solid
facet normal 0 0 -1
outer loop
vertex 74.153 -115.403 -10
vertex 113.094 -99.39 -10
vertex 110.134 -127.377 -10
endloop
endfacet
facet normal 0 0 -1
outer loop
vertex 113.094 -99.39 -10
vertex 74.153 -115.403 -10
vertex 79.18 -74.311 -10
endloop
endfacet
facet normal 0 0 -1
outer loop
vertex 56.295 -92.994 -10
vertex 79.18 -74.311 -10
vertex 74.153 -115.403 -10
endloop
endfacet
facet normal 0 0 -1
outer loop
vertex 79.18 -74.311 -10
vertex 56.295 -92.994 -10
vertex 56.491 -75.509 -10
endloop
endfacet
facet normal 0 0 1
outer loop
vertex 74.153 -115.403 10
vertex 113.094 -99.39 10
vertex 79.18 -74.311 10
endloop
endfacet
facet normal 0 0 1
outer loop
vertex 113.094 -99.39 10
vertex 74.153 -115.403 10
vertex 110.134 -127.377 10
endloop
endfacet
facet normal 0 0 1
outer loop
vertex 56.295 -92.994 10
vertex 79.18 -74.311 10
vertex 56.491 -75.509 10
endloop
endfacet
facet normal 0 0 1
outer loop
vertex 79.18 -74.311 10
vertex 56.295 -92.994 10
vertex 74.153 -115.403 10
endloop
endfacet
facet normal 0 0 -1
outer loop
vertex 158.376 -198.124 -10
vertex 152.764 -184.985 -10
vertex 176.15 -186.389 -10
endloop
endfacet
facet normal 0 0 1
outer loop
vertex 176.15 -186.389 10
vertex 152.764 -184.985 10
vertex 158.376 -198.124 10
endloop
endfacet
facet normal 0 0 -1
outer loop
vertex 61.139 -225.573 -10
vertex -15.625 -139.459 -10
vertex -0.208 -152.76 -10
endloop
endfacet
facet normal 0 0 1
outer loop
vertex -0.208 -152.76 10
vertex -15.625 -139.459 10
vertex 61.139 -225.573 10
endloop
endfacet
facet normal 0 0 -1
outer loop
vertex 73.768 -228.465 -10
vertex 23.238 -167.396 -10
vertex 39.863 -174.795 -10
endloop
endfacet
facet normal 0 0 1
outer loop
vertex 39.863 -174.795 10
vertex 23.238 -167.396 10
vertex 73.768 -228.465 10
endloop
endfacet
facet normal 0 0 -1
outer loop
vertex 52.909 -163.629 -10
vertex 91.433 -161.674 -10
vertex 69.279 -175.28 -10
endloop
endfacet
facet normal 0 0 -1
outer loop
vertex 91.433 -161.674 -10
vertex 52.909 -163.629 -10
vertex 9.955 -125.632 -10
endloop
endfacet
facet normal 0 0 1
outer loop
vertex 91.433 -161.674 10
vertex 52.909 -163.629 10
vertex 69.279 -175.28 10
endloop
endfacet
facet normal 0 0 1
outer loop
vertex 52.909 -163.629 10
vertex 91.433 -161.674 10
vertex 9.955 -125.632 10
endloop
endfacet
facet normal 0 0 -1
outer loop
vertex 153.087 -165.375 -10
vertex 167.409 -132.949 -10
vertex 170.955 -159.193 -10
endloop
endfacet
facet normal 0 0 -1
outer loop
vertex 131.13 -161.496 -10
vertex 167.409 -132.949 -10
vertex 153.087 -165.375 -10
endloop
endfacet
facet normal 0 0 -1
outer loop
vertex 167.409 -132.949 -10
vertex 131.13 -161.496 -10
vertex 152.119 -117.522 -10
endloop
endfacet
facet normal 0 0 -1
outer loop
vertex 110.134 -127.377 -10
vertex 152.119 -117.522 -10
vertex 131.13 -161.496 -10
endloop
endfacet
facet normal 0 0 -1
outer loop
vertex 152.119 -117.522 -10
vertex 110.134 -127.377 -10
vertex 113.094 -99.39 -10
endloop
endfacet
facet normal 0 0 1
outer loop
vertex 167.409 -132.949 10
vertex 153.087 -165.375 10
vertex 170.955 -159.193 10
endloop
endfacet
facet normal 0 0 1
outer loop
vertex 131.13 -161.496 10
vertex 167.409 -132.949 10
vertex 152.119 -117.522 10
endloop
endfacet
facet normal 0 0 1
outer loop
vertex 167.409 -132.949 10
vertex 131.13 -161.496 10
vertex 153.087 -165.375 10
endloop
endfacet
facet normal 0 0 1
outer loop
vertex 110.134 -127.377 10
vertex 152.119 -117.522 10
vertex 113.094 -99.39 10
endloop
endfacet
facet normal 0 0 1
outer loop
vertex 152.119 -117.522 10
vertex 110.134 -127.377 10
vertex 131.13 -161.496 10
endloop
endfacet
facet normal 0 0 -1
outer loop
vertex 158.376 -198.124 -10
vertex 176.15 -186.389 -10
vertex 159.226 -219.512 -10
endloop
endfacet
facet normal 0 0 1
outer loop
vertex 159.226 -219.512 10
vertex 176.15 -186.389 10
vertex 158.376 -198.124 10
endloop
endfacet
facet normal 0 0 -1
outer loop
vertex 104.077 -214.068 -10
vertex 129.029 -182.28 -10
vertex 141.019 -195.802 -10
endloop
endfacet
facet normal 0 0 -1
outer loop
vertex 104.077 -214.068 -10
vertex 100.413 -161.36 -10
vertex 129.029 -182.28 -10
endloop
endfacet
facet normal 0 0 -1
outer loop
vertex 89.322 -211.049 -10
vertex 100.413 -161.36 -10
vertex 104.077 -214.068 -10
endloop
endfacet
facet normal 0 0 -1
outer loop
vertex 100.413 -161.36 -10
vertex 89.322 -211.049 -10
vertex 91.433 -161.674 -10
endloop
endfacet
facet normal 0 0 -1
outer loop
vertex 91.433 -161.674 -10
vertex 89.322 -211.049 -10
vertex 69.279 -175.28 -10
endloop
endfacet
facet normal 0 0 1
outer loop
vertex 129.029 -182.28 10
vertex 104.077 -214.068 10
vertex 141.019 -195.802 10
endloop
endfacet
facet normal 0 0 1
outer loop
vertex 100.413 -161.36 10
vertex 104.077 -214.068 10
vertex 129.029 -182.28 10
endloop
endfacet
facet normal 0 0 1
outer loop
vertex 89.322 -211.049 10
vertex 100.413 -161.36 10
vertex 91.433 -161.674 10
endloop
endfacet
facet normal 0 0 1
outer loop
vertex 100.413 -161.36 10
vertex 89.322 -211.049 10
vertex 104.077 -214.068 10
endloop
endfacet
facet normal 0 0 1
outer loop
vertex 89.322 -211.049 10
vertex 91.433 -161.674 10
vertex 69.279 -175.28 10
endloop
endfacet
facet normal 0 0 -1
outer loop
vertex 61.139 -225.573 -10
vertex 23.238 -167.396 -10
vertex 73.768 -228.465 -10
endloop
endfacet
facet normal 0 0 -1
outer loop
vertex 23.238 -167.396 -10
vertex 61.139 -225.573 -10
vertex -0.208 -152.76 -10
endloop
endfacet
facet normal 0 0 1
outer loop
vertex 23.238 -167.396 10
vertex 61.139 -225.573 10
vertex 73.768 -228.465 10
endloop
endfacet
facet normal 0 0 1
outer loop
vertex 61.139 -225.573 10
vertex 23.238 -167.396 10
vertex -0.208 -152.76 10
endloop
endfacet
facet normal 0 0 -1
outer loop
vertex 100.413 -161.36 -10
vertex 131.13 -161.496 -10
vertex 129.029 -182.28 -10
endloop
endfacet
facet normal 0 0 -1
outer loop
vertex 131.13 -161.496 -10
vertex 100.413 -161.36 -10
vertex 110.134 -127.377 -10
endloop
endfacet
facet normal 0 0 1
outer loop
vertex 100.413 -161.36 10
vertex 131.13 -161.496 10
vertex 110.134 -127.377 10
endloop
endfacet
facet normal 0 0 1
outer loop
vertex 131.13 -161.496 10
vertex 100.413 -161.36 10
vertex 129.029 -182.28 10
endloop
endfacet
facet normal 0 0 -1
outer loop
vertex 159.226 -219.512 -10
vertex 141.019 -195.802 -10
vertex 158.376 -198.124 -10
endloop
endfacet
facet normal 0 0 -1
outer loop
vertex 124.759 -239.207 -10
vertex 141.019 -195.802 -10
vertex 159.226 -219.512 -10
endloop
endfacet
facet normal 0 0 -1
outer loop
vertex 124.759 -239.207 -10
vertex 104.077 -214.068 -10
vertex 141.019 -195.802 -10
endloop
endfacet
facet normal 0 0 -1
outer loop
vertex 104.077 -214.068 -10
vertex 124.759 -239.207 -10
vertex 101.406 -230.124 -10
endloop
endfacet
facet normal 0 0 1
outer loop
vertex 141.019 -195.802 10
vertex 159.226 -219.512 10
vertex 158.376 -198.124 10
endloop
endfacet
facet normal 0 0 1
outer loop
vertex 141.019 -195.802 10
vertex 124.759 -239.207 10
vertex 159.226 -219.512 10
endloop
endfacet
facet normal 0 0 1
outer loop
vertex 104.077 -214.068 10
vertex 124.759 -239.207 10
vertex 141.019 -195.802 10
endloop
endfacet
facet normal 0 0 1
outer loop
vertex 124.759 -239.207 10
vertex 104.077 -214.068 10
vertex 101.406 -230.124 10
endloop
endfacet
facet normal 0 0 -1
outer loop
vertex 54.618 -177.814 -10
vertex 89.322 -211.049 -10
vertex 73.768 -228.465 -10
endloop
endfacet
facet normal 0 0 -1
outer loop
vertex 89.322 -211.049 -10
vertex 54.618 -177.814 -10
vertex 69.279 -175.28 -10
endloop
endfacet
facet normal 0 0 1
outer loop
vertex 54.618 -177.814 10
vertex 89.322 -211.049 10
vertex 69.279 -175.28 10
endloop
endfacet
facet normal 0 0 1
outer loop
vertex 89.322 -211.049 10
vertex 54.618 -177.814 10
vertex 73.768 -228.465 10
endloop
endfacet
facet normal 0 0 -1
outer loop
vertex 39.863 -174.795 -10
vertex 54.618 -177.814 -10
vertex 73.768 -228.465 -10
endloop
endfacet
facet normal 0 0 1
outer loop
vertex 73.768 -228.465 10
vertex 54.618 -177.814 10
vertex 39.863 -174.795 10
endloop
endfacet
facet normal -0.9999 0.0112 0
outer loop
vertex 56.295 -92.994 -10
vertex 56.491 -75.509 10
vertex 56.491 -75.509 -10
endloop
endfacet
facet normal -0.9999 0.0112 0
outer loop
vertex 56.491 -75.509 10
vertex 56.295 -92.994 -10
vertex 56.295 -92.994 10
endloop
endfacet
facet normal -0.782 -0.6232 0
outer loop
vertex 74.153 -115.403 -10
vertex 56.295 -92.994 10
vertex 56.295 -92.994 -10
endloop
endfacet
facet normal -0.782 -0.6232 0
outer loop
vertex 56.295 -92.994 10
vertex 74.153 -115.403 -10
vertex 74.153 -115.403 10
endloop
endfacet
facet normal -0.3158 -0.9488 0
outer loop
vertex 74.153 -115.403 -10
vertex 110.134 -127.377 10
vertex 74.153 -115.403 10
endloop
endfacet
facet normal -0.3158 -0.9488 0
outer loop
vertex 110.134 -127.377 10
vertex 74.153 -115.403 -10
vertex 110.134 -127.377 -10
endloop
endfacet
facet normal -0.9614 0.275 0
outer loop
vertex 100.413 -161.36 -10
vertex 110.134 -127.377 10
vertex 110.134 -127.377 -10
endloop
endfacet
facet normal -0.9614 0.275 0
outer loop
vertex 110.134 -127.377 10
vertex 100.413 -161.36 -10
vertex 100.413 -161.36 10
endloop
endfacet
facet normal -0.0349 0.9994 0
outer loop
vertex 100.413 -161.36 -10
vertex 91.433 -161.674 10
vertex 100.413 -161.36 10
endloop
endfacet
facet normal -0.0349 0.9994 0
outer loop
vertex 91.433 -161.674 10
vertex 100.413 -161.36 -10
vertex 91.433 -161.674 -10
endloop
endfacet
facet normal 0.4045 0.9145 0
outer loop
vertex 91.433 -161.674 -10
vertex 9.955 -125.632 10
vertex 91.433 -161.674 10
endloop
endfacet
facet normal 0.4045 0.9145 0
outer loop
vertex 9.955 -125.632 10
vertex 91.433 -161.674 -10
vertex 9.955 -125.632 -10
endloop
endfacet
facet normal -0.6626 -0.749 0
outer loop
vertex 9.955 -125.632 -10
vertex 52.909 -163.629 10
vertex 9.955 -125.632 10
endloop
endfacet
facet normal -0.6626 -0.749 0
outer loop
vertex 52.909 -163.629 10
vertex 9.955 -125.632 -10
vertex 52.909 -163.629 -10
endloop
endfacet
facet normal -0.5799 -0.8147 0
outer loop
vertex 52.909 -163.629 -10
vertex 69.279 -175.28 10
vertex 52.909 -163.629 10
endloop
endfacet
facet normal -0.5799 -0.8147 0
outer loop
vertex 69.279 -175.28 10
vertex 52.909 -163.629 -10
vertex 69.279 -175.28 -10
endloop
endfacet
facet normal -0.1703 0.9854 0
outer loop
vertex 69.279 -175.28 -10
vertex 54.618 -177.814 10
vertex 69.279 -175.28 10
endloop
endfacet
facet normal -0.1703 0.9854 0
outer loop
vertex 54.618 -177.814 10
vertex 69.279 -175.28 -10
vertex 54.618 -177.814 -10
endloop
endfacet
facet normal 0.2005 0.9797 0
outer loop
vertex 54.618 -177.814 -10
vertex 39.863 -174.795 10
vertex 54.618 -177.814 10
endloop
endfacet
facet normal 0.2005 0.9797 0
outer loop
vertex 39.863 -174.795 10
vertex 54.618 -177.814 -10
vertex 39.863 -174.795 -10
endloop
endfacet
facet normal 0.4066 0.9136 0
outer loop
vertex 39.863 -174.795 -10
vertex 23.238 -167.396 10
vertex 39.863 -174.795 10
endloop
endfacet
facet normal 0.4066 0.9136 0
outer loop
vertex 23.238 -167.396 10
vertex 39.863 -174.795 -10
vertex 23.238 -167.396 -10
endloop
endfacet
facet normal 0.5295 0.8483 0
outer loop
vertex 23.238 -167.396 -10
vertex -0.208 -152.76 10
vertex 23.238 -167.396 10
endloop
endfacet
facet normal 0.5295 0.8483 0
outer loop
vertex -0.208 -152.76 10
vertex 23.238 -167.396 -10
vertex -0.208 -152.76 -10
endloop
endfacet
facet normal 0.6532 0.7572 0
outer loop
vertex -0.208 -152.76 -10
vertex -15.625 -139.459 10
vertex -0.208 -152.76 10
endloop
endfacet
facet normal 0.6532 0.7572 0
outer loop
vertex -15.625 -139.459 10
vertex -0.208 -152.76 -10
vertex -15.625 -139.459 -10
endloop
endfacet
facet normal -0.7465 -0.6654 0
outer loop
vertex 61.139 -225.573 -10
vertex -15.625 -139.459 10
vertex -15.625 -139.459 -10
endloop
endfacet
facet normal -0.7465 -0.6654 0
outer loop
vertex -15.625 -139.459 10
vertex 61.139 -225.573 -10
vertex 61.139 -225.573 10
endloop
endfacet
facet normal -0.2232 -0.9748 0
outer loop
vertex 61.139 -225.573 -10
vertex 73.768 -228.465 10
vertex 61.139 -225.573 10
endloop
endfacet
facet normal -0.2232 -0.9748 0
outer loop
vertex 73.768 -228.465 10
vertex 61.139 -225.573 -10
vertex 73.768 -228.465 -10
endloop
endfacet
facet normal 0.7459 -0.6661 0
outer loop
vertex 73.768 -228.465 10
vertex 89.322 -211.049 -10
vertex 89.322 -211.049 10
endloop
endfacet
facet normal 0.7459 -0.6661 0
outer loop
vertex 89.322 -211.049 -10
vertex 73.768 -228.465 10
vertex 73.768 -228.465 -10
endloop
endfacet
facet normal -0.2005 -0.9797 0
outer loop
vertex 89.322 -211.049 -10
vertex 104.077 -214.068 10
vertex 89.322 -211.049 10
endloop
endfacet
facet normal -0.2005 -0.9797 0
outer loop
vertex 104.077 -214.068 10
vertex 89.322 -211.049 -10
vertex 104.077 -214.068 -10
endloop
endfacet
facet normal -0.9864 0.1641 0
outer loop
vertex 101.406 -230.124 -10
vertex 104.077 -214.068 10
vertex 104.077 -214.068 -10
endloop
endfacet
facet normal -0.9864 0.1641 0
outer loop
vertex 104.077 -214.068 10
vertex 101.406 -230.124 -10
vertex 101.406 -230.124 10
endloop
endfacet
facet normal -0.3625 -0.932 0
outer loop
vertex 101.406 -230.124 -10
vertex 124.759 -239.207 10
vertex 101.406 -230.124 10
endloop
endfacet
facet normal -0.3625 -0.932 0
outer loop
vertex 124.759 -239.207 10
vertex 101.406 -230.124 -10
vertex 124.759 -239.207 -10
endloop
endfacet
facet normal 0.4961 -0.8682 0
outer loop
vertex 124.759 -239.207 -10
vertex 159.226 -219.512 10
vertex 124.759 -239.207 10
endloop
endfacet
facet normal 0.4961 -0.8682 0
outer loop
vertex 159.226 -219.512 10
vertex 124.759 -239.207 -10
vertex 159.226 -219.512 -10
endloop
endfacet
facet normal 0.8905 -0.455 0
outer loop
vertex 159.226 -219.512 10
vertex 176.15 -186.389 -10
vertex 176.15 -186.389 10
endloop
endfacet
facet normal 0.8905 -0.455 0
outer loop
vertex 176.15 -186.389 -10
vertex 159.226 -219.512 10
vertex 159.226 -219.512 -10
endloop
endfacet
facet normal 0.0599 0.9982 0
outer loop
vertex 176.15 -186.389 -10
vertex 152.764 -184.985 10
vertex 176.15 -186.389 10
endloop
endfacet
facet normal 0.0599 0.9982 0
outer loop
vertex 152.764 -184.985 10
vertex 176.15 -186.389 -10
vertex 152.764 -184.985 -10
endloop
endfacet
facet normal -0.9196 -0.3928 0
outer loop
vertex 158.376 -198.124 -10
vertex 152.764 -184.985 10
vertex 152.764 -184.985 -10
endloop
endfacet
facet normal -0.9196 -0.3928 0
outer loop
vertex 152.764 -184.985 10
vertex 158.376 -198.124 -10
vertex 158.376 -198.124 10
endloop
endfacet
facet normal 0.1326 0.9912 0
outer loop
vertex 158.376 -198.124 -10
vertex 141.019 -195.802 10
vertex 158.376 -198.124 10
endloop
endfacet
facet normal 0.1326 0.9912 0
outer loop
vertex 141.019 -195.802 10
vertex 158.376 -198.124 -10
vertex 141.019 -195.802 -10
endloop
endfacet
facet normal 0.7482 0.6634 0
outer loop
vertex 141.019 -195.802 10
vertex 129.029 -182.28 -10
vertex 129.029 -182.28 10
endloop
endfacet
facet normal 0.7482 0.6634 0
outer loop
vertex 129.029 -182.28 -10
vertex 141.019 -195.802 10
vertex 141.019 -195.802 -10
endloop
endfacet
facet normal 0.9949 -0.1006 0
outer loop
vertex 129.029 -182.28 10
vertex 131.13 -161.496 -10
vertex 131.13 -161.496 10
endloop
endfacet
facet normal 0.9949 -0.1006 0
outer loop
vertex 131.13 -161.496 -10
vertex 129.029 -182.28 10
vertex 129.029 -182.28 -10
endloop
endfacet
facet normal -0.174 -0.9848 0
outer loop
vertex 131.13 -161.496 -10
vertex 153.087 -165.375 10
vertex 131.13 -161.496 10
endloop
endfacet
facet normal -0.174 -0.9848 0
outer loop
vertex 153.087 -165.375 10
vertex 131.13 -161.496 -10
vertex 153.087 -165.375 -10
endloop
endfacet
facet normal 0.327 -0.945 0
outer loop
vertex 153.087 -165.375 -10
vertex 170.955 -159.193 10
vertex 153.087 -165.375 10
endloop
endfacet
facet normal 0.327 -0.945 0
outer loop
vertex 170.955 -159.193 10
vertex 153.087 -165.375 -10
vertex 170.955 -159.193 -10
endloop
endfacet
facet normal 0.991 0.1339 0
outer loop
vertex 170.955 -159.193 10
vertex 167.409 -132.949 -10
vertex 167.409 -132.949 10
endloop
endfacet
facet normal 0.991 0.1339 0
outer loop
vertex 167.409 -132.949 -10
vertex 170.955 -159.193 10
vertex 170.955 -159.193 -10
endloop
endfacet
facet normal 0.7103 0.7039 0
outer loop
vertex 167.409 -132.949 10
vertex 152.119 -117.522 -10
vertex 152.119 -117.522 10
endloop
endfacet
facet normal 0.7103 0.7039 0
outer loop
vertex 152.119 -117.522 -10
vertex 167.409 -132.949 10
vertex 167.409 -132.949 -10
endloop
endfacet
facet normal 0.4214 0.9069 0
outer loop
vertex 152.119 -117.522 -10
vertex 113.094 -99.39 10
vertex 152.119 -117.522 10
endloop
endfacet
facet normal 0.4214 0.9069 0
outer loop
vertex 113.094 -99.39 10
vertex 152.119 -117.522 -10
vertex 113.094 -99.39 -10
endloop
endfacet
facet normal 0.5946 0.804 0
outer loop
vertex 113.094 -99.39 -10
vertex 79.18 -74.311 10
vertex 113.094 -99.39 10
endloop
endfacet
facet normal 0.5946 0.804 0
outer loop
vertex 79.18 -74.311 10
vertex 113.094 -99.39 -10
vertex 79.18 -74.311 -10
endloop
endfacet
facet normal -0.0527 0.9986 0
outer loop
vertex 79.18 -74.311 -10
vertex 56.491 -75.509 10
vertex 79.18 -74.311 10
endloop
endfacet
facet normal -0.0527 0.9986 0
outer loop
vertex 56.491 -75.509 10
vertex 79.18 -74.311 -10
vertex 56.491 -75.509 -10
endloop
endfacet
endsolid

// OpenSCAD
polyhedron(
    points=[
    [56.4911669365257, -75.5094286870824, -10],
    [56.2951697104678, -92.9939058407573, -10],
    [74.1533172293988, -115.402687008909, -10],
    [110.133995916481, -127.377323432071, -10],
    [100.412998690423, -161.35958452784, -10],
    [91.4326351135859, -161.674030513363, -10],
    [9.95543978285085, -125.63167248441, -10],
    [52.9089024120268, -163.629092849666, -10],
    [69.2790755512251, -175.280121243875, -10],
    [54.6179051859689, -177.814013214922, -10],
    [39.8633172293988, -174.794709200446, -10],
    [23.2379224844099, -167.395737594655, -10],
    [-0.207614231625769, -152.75959839755, -10],
    [-15.625287370824, -139.458791609132, -10],
    [61.139470296214, -225.573331099109, -10],
    [73.7680298585748, -228.465024310691, -10],
    [89.3224758440982, -211.048933580178, -10],
    [104.077063800668, -214.068237594655, -10],
    [101.406398983296, -230.12396474833, -10],
    [124.758518108018, -239.206907959911, -10],
    [159.226191247216, -219.512146864143, -10],
    [176.150162853007, -186.38896817706, -10],
    [152.763850516704, -184.985249345212, -10],
    [158.37627088196, -198.124252119154, -10],
    [141.019404531181, -195.802226498886, -10],
    [129.028898983296, -182.280391316258, -10],
    [131.129896209354, -161.496357374165, -10],
    [153.087458545657, -165.374743797327, -10],
    [170.954768108018, -159.192655840757, -10],
    [167.409151757238, -132.948843504454, -10],
    [152.119089420936, -117.522008321826, -10],
    [113.094075551225, -99.390315110245, -10],
    [79.1802008786192, -74.3108691247216, -10],
    [56.4911669365257, -75.5094286870824, 10],
    [56.2951697104678, -92.9939058407573, 10],
    [74.1533172293988, -115.402687008909, 10],
    [110.133995916481, -127.377323432071, 10],
    [100.412998690423, -161.35958452784, 10],
    [91.4326351135859, -161.674030513363, 10],
    [9.95543978285085, -125.63167248441, 10],
    [52.9089024120268, -163.629092849666, 10],
    [69.2790755512251, -175.280121243875, 10],
    [54.6179051859689, -177.814013214922, 10],
    [39.8633172293988, -174.794709200446, 10],
    [23.2379224844099, -167.395737594655, 10],
    [-0.207614231625769, -152.75959839755, 10],
    [-15.625287370824, -139.458791609132, 10],
    [61.139470296214, -225.573331099109, 10],
    [73.7680298585748, -228.465024310691, 10],
    [89.3224758440982, -211.048933580178, 10],
    [104.077063800668, -214.068237594655, 10],
    [101.406398983296, -230.12396474833, 10],
    [124.758518108018, -239.206907959911, 10],
    [159.226191247216, -219.512146864143, 10],
    [176.150162853007, -186.38896817706, 10],
    [152.763850516704, -184.985249345212, 10],
    [158.37627088196, -198.124252119154, 10],
    [141.019404531181, -195.802226498886, 10],
    [129.028898983296, -182.280391316258, 10],
    [131.129896209354, -161.496357374165, 10],
    [153.087458545657, -165.374743797327, 10],
    [170.954768108018, -159.192655840757, 10],
    [167.409151757238, -132.948843504454, 10],
    [152.119089420936, -117.522008321826, 10],
    [113.094075551225, -99.390315110245, 10],
    [79.1802008786192, -74.3108691247216, 10],
    ],
    faces=[
        [31,32,0,1,2,3],
        [36,35,34,33,65,64],
        [21,22,23],
        [56,55,54],
        [12,13,14],
        [47,46,45],
        [10,11,15],
        [48,44,43],
        [5,6,7,8],
        [41,40,39,38],
        [26,27,28,29,30,31,3],
        [36,64,63,62,61,60,59],
        [20,21,23],
        [56,54,53],
        [16,17,24,25,4,5,8],
        [41,38,37,58,57,50,49],
        [11,12,14,15],
        [48,47,45,44],
        [25,26,3,4],
        [37,36,59,58],
        [17,18,19,20,23,24],
        [57,56,53,52,51,50],
        [8,9,15,16],
        [49,48,42,41],
        [15,9,10],
        [43,42,48],
        [0,33,34,1],
        [1,34,35,2],
        [2,35,36,3],
        [3,36,37,4],
        [4,37,38,5],
        [5,38,39,6],
        [6,39,40,7],
        [7,40,41,8],
        [8,41,42,9],
        [9,42,43,10],
        [10,43,44,11],
        [11,44,45,12],
        [12,45,46,13],
        [13,46,47,14],
        [14,47,48,15],
        [15,48,49,16],
        [16,49,50,17],
        [17,50,51,18],
        [18,51,52,19],
        [19,52,53,20],
        [20,53,54,21],
        [21,54,55,22],
        [22,55,56,23],
        [23,56,57,24],
        [24,57,58,25],
        [25,58,59,26],
        [26,59,60,27],
        [27,60,61,28],
        [28,61,62,29],
        [29,62,63,30],
        [30,63,64,31],
        [31,64,65,32],
        [32,65,33,0],
    ]
);
